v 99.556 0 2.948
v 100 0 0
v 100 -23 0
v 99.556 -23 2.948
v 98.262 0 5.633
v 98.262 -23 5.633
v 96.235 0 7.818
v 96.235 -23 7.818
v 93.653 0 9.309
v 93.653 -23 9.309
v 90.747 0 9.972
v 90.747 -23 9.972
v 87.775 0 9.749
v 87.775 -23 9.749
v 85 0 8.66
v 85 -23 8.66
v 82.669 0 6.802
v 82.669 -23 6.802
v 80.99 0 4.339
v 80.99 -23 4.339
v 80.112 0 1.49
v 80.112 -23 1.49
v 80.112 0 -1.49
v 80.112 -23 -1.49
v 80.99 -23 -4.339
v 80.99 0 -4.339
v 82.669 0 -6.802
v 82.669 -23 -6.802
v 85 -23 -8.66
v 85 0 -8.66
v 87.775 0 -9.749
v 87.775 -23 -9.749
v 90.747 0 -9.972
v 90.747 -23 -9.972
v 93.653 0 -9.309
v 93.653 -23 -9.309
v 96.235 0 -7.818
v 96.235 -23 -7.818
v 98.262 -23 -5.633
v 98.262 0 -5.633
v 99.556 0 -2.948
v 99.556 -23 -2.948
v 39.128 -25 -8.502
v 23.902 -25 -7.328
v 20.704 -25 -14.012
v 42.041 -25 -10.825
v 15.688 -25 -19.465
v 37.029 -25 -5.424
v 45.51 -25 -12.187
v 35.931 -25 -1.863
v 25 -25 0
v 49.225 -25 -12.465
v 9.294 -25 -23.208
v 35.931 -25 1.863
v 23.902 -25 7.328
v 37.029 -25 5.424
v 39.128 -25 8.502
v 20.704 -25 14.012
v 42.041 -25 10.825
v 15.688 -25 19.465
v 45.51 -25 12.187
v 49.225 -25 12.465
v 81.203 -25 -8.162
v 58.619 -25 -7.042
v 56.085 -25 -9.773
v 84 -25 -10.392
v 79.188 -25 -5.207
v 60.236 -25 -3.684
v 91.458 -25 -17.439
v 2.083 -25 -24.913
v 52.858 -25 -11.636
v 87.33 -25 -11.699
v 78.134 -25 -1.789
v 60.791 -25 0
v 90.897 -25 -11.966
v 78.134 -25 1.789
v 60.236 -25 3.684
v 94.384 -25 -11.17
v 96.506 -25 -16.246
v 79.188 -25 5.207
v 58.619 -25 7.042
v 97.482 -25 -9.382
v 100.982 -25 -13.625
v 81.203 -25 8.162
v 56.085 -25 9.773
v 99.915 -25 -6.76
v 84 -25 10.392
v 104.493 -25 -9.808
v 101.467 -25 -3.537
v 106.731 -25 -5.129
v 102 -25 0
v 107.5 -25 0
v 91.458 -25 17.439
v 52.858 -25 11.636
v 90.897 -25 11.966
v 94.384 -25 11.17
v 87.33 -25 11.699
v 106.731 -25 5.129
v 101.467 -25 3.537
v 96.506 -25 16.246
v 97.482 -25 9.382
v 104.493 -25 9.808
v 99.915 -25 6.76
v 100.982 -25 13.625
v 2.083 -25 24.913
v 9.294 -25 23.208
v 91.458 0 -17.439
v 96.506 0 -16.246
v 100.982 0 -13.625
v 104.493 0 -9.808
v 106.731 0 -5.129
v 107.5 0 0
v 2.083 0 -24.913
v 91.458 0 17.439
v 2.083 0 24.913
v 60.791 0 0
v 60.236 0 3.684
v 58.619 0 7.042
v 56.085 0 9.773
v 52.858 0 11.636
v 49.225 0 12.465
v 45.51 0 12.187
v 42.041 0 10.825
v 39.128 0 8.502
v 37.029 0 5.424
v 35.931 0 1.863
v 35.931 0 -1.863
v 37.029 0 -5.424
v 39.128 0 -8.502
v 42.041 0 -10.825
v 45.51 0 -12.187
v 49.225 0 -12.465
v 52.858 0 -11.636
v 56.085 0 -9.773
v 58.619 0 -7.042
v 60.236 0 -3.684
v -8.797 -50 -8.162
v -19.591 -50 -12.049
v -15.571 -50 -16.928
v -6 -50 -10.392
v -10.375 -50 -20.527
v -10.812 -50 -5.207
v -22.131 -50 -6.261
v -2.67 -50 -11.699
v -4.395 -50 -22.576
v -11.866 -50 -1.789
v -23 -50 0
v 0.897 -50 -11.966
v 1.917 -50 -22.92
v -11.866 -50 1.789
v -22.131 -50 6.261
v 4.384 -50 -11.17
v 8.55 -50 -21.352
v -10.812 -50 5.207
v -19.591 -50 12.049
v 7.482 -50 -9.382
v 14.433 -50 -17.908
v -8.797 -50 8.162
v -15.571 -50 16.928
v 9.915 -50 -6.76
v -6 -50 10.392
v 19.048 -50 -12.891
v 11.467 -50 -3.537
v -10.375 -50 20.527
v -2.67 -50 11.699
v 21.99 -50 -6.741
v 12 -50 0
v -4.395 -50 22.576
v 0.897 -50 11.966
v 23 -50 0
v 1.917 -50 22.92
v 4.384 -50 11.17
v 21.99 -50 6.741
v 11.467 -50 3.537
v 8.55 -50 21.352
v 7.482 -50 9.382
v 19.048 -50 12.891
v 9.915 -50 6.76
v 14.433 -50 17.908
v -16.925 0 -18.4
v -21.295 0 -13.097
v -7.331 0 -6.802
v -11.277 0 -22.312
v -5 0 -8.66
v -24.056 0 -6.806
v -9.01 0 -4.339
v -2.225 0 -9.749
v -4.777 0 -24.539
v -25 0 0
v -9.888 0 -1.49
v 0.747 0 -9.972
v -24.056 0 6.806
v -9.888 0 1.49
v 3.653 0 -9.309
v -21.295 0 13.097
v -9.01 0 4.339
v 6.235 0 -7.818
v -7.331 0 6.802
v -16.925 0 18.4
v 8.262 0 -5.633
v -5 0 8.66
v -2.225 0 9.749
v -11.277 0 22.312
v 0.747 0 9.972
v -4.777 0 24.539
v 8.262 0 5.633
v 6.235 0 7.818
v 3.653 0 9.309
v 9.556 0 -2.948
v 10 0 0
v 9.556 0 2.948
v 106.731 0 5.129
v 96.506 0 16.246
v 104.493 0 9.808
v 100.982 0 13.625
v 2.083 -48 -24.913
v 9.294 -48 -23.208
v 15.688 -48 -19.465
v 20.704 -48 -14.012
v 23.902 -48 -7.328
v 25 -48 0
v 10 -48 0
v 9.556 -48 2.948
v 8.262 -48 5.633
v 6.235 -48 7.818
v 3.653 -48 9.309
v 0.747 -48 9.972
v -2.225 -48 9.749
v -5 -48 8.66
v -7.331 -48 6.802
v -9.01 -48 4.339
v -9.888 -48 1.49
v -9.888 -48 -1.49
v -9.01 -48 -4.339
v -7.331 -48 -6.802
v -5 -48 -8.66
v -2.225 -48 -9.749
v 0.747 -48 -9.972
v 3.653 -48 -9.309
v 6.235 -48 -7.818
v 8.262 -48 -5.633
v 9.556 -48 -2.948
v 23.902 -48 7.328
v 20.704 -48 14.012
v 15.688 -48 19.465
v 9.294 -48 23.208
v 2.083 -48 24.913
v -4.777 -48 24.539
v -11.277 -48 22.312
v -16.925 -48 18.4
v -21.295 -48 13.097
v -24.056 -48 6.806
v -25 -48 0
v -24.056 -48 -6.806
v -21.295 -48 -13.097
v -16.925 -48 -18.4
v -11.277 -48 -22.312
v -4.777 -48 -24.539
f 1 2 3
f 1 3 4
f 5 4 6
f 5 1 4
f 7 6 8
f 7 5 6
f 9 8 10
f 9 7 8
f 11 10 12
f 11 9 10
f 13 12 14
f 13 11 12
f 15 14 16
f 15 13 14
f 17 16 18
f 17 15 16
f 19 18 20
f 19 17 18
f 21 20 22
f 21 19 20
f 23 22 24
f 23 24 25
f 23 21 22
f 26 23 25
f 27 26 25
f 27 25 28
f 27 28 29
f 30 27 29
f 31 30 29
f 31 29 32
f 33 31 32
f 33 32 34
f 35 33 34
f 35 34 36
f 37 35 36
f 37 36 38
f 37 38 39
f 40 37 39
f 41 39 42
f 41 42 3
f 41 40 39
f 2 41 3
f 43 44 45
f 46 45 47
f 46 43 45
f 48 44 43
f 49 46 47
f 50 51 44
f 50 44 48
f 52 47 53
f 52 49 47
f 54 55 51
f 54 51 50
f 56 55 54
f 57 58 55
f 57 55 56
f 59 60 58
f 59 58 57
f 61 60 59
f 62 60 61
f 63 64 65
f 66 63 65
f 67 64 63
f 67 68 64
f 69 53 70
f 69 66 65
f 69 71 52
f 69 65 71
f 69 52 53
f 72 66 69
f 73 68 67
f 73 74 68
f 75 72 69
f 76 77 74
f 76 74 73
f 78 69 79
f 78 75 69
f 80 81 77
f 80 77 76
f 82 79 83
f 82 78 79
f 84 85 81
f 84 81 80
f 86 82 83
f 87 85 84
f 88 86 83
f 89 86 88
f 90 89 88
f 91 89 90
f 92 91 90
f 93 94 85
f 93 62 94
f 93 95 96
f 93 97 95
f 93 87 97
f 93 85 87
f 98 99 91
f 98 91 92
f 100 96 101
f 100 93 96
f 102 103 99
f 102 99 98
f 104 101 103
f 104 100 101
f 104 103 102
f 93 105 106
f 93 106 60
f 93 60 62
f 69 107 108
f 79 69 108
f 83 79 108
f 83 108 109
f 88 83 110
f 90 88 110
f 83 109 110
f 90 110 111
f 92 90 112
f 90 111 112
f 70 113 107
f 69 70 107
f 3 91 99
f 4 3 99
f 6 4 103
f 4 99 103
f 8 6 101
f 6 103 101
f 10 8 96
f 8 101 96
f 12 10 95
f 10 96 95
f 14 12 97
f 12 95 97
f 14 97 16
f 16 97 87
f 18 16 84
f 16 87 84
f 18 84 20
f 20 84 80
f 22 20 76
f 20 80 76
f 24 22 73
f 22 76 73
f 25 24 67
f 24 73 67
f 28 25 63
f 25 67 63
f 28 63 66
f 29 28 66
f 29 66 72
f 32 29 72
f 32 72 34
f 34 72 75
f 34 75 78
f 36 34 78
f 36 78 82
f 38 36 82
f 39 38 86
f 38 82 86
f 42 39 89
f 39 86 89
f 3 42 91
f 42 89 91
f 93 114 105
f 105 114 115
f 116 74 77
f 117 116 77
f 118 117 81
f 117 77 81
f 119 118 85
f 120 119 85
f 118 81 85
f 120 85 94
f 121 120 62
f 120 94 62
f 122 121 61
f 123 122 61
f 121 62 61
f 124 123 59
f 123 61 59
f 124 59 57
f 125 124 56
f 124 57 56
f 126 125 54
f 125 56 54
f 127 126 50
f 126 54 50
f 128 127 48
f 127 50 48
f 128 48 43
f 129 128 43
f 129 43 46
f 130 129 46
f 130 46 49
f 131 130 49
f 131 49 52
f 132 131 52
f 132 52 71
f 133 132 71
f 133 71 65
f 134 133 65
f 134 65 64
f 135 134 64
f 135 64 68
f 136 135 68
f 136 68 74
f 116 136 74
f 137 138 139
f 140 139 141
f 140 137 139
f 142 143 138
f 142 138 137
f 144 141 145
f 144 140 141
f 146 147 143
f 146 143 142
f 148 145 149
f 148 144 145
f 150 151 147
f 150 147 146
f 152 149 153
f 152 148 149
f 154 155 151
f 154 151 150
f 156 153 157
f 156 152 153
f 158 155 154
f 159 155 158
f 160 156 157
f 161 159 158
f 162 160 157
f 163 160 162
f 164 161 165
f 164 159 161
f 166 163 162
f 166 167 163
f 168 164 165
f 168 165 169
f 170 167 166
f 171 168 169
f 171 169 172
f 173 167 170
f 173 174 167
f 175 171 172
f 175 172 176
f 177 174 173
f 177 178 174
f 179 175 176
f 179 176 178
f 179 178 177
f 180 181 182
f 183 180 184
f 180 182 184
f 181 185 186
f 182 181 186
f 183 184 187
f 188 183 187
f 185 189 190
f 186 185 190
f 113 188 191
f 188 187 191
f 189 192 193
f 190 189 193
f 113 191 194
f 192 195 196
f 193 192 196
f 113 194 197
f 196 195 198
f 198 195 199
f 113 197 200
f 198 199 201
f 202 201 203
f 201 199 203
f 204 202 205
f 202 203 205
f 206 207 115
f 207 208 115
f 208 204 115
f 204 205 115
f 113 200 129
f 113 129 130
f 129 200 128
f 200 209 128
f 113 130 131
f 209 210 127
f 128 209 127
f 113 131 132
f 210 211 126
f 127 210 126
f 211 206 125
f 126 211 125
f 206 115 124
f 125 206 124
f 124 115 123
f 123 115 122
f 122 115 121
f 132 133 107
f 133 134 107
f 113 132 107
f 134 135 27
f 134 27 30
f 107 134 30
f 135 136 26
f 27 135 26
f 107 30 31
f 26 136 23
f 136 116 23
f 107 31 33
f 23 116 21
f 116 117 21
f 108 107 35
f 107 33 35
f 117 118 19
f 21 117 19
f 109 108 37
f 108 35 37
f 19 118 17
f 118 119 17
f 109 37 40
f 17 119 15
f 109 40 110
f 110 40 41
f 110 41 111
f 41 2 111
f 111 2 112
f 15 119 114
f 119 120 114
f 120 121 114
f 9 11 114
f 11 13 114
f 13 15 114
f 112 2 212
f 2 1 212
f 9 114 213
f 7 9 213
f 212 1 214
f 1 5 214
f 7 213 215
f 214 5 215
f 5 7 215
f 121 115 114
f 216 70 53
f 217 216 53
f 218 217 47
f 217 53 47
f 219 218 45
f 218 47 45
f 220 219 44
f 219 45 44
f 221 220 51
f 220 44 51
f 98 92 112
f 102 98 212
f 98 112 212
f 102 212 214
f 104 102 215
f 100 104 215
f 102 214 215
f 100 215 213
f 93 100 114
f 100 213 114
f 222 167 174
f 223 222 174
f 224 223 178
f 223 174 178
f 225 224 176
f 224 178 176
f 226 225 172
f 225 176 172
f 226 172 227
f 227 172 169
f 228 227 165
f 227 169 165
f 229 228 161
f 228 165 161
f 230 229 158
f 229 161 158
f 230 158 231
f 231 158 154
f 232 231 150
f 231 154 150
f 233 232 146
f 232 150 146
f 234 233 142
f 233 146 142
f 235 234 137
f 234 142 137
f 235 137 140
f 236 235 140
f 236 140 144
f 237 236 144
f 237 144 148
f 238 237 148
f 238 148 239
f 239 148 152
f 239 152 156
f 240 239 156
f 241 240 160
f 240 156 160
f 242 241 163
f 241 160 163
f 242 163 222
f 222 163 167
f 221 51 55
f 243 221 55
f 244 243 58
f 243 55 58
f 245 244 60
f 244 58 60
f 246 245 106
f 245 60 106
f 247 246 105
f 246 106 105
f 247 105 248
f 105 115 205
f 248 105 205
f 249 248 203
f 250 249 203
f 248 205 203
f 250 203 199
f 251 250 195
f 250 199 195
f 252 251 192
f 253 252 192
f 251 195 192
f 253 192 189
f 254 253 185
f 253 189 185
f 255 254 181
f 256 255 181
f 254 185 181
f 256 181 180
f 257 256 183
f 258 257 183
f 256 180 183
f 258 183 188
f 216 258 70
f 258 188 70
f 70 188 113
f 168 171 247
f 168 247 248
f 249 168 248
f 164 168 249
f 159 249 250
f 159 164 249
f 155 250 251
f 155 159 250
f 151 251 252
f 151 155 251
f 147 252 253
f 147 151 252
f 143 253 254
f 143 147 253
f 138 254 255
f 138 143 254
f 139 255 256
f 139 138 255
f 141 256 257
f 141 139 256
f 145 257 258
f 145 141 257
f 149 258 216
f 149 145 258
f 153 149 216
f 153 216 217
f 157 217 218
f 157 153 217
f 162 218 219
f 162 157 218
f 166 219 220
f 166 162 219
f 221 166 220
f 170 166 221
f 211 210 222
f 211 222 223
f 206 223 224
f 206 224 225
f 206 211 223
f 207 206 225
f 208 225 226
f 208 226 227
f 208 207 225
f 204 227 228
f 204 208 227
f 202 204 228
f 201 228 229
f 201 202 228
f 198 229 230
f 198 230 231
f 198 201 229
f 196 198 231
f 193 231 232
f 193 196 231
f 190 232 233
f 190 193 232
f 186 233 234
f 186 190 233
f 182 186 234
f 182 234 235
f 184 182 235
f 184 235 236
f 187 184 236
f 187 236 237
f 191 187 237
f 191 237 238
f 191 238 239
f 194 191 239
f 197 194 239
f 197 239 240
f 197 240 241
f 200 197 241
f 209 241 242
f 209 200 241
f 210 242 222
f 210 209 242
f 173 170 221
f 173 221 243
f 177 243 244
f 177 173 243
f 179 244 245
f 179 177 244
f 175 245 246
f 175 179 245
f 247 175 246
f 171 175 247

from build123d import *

# Parameters (mm, degrees)
F0_R     = 10
F1_DEPTH = 25
F2_DEPTH = 50
F3_SIZE  = 2
F5_R     = 12.5
F6_DEPTH = 25.001


with BuildPart() as f1:
    # F0 (on Front) → F1 (new body)
    with BuildSketch(Plane.XZ):
        with BuildLine():
            ThreePointArc((2.083333, -24.913043), (18.399502, -16.92508), (25, 0))
            ThreePointArc((25, 0), (18.399502, 16.92508), (2.083333, 24.913043))
            ThreePointArc((2.083333, 24.913043), (-25, 0), (2.083333, -24.913043))
        make_face()
        Circle(F0_R, mode=Mode.SUBTRACT)
        with BuildLine():
            ThreePointArc((2.083333, 24.913043), (18.399502, 16.92508), (25, 0))
            ThreePointArc((25, 0), (18.399502, -16.92508), (2.083333, -24.913043))
            Line((2.083333, -24.913043), (91.458333, -17.43913))
            ThreePointArc((91.458333, -17.43913), (72.5, 0), (91.458333, 17.43913))
            Line((91.458333, 17.43913), (2.083333, 24.913043))
        make_face()
        with BuildLine():
            ThreePointArc((107.5, 0), (102.879651, 11.847556), (91.458333, 17.43913))
            ThreePointArc((91.458333, 17.43913), (72.5, 0), (91.458333, -17.43913))
            ThreePointArc((91.458333, -17.43913), (102.879651, -11.847556), (107.5, 0))
        make_face()
        with Locations((90, 0)):
            Circle(F0_R, mode=Mode.SUBTRACT)
    extrude(amount=F1_DEPTH)

    # F0 (on Front) → F2 (join)
    with BuildSketch(Plane.XZ):
        with BuildLine():
            ThreePointArc((2.083333, -24.913043), (18.399502, -16.92508), (25, 0))
            ThreePointArc((25, 0), (18.399502, 16.92508), (2.083333, 24.913043))
            ThreePointArc((2.083333, 24.913043), (-25, 0), (2.083333, -24.913043))
        make_face()
        Circle(F0_R, mode=Mode.SUBTRACT)
    extrude(amount=F2_DEPTH)

    # F3
    f3_edges = [f1.edges().sort_by_distance(p)[0] for p in [
        (-2.083333, -50, 24.913043),
        (-10, -50, 0),
        (80, -25, 0),
    ]]
    chamfer(f3_edges, length=F3_SIZE)

    # F5 (on face) → F6 (cut, through all)
    with BuildSketch(Plane.XZ.offset(25)):
        with Locations((48.291023, 0)):
            Circle(F5_R)
    extrude(amount=-F6_DEPTH, mode=Mode.SUBTRACT)


solid = f1.part
